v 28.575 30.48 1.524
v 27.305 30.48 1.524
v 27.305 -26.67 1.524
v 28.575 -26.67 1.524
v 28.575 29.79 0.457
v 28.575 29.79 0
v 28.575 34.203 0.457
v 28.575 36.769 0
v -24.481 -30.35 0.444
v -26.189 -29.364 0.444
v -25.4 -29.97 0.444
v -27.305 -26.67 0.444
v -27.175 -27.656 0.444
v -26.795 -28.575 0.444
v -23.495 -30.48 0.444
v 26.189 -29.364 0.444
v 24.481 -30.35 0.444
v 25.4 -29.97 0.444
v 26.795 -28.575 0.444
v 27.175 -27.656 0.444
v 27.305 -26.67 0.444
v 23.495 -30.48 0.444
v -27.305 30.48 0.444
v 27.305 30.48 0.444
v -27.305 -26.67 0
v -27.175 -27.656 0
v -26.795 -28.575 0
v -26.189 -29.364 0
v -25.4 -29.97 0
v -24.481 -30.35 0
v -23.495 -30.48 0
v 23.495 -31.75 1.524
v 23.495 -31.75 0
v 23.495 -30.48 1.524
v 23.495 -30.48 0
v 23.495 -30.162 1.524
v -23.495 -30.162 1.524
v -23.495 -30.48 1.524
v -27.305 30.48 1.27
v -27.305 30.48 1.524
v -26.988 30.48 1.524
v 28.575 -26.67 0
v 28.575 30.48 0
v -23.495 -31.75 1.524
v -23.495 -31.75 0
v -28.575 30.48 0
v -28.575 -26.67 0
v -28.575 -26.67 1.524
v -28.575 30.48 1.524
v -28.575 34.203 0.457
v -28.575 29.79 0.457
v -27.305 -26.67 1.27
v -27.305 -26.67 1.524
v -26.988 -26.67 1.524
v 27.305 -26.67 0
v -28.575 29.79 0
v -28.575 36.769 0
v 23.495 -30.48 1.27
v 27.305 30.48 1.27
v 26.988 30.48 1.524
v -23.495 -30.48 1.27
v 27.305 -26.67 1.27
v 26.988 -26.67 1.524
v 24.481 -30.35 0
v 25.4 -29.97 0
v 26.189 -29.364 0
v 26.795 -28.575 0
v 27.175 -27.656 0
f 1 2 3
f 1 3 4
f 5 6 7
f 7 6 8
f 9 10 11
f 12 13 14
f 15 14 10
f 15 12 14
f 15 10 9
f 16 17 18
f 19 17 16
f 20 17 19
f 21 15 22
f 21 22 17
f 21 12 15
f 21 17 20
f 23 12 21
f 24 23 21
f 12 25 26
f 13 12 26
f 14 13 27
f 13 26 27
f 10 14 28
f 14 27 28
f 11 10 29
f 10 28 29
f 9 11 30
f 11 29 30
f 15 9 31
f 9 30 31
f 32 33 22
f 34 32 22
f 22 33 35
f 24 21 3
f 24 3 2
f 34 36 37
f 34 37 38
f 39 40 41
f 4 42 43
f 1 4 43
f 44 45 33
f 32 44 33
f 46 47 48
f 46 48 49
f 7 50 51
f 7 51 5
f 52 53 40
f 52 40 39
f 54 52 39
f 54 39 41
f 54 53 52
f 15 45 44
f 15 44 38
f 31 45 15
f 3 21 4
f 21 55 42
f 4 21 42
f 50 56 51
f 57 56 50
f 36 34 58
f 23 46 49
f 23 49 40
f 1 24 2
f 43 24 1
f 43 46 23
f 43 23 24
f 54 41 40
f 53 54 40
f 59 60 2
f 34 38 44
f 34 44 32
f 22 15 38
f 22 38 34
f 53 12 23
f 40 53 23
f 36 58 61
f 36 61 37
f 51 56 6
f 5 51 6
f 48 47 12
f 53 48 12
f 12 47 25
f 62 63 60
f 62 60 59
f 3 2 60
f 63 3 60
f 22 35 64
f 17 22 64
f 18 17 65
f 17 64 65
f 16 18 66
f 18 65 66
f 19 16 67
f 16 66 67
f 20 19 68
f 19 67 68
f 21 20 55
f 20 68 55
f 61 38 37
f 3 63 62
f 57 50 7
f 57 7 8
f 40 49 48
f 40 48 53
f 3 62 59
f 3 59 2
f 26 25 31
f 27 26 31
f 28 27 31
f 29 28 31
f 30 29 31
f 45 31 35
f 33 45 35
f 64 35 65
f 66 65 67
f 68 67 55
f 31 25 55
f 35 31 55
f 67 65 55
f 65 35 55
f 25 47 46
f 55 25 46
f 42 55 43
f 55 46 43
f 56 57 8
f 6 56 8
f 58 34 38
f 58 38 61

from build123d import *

# Parameters (mm, degrees)
F1_DEPTH  = 0.4445
F0_W      = 1.27
F0_H      = 57.15
F0_W_2    = 46.99
F0_H_2    = 1.27
F2_DEPTH  = 1.524
F4_DEPTH  = 57.15
F6_DEPTH  = 57.15
F8_DEPTH  = 46.99
F9_W      = 57.15
F9_H      = 6.978494
F10_DEPTH = 0.4572
F12_DEPTH = 76.2


with BuildPart() as f1:
    # F0 (on Top) → F1 (new body)
    with BuildSketch(Plane.XY):
        with BuildLine():
            Line((26.056772, 30.48), (-27.305, 30.48))
            Line((-27.305, 30.48), (-27.305, -26.67))
            ThreePointArc((-27.305, -26.67), (-26.189077, -29.364077), (-23.495, -30.48))
            Line((-23.495, -30.48), (23.495, -30.48))
            ThreePointArc((23.495, -30.48), (26.189077, -29.364077), (27.305, -26.67))
            Line((27.305, -26.67), (27.305, 30.48))
            Line((27.305, 30.48), (26.056772, 30.48))
        make_face()
    extrude(amount=F1_DEPTH)

    # F0 (on Top) → F2 (join)
    with BuildSketch(Plane.XY):
        with Locations((-27.94, 1.905)):
            Rectangle(F0_W, F0_H)
        with Locations((27.94, 1.905)):
            Rectangle(F0_W, F0_H)
        with Locations((0, -31.115)):
            Rectangle(F0_W_2, F0_H_2)
    extrude(amount=F2_DEPTH)


with BuildPart() as f4:
    # F3 (on face) → F4 (new body)
    with BuildSketch(Plane.XZ.offset(26.67)):
        Polygon((27.305, 1.27), (27.305, 1.524), (26.9875, 1.524), align=None)
    extrude(amount=-F4_DEPTH)


with BuildPart() as f6:
    # F5 (on face) → F6 (new body)
    with BuildSketch(Plane.XZ.offset(26.67)):
        Polygon((-26.9875, 1.524), (-27.305, 1.524), (-27.305, 1.27), align=None)
    extrude(amount=-F6_DEPTH)


with BuildPart() as f8:
    # F7 (on face) → F8 (new body, through all)
    with BuildSketch(Plane.YZ.offset(23.495)):
        Polygon((-30.1625, 1.524), (-30.48, 1.524), (-30.48, 1.27), align=None)
    extrude(amount=-F8_DEPTH)


with BuildPart() as f10:
    # F9 (on Top) → F10 (new body)
    with BuildSketch(Plane.XY):
        with Locations((0, 33.27965)):
            Rectangle(F9_W, F9_H)
    extrude(amount=F10_DEPTH)

    # F11 (on face) → F12 (cut)
    with BuildSketch(Plane.YZ.offset(28.575)):
        Polygon((34.203231, 0.4572), (36.768897, 0), (36.768897, 0.4572), align=None)
    extrude(amount=-F12_DEPTH, mode=Mode.SUBTRACT)


solid = Compound([f1.part, f4.part, f6.part, f8.part, f10.part])
